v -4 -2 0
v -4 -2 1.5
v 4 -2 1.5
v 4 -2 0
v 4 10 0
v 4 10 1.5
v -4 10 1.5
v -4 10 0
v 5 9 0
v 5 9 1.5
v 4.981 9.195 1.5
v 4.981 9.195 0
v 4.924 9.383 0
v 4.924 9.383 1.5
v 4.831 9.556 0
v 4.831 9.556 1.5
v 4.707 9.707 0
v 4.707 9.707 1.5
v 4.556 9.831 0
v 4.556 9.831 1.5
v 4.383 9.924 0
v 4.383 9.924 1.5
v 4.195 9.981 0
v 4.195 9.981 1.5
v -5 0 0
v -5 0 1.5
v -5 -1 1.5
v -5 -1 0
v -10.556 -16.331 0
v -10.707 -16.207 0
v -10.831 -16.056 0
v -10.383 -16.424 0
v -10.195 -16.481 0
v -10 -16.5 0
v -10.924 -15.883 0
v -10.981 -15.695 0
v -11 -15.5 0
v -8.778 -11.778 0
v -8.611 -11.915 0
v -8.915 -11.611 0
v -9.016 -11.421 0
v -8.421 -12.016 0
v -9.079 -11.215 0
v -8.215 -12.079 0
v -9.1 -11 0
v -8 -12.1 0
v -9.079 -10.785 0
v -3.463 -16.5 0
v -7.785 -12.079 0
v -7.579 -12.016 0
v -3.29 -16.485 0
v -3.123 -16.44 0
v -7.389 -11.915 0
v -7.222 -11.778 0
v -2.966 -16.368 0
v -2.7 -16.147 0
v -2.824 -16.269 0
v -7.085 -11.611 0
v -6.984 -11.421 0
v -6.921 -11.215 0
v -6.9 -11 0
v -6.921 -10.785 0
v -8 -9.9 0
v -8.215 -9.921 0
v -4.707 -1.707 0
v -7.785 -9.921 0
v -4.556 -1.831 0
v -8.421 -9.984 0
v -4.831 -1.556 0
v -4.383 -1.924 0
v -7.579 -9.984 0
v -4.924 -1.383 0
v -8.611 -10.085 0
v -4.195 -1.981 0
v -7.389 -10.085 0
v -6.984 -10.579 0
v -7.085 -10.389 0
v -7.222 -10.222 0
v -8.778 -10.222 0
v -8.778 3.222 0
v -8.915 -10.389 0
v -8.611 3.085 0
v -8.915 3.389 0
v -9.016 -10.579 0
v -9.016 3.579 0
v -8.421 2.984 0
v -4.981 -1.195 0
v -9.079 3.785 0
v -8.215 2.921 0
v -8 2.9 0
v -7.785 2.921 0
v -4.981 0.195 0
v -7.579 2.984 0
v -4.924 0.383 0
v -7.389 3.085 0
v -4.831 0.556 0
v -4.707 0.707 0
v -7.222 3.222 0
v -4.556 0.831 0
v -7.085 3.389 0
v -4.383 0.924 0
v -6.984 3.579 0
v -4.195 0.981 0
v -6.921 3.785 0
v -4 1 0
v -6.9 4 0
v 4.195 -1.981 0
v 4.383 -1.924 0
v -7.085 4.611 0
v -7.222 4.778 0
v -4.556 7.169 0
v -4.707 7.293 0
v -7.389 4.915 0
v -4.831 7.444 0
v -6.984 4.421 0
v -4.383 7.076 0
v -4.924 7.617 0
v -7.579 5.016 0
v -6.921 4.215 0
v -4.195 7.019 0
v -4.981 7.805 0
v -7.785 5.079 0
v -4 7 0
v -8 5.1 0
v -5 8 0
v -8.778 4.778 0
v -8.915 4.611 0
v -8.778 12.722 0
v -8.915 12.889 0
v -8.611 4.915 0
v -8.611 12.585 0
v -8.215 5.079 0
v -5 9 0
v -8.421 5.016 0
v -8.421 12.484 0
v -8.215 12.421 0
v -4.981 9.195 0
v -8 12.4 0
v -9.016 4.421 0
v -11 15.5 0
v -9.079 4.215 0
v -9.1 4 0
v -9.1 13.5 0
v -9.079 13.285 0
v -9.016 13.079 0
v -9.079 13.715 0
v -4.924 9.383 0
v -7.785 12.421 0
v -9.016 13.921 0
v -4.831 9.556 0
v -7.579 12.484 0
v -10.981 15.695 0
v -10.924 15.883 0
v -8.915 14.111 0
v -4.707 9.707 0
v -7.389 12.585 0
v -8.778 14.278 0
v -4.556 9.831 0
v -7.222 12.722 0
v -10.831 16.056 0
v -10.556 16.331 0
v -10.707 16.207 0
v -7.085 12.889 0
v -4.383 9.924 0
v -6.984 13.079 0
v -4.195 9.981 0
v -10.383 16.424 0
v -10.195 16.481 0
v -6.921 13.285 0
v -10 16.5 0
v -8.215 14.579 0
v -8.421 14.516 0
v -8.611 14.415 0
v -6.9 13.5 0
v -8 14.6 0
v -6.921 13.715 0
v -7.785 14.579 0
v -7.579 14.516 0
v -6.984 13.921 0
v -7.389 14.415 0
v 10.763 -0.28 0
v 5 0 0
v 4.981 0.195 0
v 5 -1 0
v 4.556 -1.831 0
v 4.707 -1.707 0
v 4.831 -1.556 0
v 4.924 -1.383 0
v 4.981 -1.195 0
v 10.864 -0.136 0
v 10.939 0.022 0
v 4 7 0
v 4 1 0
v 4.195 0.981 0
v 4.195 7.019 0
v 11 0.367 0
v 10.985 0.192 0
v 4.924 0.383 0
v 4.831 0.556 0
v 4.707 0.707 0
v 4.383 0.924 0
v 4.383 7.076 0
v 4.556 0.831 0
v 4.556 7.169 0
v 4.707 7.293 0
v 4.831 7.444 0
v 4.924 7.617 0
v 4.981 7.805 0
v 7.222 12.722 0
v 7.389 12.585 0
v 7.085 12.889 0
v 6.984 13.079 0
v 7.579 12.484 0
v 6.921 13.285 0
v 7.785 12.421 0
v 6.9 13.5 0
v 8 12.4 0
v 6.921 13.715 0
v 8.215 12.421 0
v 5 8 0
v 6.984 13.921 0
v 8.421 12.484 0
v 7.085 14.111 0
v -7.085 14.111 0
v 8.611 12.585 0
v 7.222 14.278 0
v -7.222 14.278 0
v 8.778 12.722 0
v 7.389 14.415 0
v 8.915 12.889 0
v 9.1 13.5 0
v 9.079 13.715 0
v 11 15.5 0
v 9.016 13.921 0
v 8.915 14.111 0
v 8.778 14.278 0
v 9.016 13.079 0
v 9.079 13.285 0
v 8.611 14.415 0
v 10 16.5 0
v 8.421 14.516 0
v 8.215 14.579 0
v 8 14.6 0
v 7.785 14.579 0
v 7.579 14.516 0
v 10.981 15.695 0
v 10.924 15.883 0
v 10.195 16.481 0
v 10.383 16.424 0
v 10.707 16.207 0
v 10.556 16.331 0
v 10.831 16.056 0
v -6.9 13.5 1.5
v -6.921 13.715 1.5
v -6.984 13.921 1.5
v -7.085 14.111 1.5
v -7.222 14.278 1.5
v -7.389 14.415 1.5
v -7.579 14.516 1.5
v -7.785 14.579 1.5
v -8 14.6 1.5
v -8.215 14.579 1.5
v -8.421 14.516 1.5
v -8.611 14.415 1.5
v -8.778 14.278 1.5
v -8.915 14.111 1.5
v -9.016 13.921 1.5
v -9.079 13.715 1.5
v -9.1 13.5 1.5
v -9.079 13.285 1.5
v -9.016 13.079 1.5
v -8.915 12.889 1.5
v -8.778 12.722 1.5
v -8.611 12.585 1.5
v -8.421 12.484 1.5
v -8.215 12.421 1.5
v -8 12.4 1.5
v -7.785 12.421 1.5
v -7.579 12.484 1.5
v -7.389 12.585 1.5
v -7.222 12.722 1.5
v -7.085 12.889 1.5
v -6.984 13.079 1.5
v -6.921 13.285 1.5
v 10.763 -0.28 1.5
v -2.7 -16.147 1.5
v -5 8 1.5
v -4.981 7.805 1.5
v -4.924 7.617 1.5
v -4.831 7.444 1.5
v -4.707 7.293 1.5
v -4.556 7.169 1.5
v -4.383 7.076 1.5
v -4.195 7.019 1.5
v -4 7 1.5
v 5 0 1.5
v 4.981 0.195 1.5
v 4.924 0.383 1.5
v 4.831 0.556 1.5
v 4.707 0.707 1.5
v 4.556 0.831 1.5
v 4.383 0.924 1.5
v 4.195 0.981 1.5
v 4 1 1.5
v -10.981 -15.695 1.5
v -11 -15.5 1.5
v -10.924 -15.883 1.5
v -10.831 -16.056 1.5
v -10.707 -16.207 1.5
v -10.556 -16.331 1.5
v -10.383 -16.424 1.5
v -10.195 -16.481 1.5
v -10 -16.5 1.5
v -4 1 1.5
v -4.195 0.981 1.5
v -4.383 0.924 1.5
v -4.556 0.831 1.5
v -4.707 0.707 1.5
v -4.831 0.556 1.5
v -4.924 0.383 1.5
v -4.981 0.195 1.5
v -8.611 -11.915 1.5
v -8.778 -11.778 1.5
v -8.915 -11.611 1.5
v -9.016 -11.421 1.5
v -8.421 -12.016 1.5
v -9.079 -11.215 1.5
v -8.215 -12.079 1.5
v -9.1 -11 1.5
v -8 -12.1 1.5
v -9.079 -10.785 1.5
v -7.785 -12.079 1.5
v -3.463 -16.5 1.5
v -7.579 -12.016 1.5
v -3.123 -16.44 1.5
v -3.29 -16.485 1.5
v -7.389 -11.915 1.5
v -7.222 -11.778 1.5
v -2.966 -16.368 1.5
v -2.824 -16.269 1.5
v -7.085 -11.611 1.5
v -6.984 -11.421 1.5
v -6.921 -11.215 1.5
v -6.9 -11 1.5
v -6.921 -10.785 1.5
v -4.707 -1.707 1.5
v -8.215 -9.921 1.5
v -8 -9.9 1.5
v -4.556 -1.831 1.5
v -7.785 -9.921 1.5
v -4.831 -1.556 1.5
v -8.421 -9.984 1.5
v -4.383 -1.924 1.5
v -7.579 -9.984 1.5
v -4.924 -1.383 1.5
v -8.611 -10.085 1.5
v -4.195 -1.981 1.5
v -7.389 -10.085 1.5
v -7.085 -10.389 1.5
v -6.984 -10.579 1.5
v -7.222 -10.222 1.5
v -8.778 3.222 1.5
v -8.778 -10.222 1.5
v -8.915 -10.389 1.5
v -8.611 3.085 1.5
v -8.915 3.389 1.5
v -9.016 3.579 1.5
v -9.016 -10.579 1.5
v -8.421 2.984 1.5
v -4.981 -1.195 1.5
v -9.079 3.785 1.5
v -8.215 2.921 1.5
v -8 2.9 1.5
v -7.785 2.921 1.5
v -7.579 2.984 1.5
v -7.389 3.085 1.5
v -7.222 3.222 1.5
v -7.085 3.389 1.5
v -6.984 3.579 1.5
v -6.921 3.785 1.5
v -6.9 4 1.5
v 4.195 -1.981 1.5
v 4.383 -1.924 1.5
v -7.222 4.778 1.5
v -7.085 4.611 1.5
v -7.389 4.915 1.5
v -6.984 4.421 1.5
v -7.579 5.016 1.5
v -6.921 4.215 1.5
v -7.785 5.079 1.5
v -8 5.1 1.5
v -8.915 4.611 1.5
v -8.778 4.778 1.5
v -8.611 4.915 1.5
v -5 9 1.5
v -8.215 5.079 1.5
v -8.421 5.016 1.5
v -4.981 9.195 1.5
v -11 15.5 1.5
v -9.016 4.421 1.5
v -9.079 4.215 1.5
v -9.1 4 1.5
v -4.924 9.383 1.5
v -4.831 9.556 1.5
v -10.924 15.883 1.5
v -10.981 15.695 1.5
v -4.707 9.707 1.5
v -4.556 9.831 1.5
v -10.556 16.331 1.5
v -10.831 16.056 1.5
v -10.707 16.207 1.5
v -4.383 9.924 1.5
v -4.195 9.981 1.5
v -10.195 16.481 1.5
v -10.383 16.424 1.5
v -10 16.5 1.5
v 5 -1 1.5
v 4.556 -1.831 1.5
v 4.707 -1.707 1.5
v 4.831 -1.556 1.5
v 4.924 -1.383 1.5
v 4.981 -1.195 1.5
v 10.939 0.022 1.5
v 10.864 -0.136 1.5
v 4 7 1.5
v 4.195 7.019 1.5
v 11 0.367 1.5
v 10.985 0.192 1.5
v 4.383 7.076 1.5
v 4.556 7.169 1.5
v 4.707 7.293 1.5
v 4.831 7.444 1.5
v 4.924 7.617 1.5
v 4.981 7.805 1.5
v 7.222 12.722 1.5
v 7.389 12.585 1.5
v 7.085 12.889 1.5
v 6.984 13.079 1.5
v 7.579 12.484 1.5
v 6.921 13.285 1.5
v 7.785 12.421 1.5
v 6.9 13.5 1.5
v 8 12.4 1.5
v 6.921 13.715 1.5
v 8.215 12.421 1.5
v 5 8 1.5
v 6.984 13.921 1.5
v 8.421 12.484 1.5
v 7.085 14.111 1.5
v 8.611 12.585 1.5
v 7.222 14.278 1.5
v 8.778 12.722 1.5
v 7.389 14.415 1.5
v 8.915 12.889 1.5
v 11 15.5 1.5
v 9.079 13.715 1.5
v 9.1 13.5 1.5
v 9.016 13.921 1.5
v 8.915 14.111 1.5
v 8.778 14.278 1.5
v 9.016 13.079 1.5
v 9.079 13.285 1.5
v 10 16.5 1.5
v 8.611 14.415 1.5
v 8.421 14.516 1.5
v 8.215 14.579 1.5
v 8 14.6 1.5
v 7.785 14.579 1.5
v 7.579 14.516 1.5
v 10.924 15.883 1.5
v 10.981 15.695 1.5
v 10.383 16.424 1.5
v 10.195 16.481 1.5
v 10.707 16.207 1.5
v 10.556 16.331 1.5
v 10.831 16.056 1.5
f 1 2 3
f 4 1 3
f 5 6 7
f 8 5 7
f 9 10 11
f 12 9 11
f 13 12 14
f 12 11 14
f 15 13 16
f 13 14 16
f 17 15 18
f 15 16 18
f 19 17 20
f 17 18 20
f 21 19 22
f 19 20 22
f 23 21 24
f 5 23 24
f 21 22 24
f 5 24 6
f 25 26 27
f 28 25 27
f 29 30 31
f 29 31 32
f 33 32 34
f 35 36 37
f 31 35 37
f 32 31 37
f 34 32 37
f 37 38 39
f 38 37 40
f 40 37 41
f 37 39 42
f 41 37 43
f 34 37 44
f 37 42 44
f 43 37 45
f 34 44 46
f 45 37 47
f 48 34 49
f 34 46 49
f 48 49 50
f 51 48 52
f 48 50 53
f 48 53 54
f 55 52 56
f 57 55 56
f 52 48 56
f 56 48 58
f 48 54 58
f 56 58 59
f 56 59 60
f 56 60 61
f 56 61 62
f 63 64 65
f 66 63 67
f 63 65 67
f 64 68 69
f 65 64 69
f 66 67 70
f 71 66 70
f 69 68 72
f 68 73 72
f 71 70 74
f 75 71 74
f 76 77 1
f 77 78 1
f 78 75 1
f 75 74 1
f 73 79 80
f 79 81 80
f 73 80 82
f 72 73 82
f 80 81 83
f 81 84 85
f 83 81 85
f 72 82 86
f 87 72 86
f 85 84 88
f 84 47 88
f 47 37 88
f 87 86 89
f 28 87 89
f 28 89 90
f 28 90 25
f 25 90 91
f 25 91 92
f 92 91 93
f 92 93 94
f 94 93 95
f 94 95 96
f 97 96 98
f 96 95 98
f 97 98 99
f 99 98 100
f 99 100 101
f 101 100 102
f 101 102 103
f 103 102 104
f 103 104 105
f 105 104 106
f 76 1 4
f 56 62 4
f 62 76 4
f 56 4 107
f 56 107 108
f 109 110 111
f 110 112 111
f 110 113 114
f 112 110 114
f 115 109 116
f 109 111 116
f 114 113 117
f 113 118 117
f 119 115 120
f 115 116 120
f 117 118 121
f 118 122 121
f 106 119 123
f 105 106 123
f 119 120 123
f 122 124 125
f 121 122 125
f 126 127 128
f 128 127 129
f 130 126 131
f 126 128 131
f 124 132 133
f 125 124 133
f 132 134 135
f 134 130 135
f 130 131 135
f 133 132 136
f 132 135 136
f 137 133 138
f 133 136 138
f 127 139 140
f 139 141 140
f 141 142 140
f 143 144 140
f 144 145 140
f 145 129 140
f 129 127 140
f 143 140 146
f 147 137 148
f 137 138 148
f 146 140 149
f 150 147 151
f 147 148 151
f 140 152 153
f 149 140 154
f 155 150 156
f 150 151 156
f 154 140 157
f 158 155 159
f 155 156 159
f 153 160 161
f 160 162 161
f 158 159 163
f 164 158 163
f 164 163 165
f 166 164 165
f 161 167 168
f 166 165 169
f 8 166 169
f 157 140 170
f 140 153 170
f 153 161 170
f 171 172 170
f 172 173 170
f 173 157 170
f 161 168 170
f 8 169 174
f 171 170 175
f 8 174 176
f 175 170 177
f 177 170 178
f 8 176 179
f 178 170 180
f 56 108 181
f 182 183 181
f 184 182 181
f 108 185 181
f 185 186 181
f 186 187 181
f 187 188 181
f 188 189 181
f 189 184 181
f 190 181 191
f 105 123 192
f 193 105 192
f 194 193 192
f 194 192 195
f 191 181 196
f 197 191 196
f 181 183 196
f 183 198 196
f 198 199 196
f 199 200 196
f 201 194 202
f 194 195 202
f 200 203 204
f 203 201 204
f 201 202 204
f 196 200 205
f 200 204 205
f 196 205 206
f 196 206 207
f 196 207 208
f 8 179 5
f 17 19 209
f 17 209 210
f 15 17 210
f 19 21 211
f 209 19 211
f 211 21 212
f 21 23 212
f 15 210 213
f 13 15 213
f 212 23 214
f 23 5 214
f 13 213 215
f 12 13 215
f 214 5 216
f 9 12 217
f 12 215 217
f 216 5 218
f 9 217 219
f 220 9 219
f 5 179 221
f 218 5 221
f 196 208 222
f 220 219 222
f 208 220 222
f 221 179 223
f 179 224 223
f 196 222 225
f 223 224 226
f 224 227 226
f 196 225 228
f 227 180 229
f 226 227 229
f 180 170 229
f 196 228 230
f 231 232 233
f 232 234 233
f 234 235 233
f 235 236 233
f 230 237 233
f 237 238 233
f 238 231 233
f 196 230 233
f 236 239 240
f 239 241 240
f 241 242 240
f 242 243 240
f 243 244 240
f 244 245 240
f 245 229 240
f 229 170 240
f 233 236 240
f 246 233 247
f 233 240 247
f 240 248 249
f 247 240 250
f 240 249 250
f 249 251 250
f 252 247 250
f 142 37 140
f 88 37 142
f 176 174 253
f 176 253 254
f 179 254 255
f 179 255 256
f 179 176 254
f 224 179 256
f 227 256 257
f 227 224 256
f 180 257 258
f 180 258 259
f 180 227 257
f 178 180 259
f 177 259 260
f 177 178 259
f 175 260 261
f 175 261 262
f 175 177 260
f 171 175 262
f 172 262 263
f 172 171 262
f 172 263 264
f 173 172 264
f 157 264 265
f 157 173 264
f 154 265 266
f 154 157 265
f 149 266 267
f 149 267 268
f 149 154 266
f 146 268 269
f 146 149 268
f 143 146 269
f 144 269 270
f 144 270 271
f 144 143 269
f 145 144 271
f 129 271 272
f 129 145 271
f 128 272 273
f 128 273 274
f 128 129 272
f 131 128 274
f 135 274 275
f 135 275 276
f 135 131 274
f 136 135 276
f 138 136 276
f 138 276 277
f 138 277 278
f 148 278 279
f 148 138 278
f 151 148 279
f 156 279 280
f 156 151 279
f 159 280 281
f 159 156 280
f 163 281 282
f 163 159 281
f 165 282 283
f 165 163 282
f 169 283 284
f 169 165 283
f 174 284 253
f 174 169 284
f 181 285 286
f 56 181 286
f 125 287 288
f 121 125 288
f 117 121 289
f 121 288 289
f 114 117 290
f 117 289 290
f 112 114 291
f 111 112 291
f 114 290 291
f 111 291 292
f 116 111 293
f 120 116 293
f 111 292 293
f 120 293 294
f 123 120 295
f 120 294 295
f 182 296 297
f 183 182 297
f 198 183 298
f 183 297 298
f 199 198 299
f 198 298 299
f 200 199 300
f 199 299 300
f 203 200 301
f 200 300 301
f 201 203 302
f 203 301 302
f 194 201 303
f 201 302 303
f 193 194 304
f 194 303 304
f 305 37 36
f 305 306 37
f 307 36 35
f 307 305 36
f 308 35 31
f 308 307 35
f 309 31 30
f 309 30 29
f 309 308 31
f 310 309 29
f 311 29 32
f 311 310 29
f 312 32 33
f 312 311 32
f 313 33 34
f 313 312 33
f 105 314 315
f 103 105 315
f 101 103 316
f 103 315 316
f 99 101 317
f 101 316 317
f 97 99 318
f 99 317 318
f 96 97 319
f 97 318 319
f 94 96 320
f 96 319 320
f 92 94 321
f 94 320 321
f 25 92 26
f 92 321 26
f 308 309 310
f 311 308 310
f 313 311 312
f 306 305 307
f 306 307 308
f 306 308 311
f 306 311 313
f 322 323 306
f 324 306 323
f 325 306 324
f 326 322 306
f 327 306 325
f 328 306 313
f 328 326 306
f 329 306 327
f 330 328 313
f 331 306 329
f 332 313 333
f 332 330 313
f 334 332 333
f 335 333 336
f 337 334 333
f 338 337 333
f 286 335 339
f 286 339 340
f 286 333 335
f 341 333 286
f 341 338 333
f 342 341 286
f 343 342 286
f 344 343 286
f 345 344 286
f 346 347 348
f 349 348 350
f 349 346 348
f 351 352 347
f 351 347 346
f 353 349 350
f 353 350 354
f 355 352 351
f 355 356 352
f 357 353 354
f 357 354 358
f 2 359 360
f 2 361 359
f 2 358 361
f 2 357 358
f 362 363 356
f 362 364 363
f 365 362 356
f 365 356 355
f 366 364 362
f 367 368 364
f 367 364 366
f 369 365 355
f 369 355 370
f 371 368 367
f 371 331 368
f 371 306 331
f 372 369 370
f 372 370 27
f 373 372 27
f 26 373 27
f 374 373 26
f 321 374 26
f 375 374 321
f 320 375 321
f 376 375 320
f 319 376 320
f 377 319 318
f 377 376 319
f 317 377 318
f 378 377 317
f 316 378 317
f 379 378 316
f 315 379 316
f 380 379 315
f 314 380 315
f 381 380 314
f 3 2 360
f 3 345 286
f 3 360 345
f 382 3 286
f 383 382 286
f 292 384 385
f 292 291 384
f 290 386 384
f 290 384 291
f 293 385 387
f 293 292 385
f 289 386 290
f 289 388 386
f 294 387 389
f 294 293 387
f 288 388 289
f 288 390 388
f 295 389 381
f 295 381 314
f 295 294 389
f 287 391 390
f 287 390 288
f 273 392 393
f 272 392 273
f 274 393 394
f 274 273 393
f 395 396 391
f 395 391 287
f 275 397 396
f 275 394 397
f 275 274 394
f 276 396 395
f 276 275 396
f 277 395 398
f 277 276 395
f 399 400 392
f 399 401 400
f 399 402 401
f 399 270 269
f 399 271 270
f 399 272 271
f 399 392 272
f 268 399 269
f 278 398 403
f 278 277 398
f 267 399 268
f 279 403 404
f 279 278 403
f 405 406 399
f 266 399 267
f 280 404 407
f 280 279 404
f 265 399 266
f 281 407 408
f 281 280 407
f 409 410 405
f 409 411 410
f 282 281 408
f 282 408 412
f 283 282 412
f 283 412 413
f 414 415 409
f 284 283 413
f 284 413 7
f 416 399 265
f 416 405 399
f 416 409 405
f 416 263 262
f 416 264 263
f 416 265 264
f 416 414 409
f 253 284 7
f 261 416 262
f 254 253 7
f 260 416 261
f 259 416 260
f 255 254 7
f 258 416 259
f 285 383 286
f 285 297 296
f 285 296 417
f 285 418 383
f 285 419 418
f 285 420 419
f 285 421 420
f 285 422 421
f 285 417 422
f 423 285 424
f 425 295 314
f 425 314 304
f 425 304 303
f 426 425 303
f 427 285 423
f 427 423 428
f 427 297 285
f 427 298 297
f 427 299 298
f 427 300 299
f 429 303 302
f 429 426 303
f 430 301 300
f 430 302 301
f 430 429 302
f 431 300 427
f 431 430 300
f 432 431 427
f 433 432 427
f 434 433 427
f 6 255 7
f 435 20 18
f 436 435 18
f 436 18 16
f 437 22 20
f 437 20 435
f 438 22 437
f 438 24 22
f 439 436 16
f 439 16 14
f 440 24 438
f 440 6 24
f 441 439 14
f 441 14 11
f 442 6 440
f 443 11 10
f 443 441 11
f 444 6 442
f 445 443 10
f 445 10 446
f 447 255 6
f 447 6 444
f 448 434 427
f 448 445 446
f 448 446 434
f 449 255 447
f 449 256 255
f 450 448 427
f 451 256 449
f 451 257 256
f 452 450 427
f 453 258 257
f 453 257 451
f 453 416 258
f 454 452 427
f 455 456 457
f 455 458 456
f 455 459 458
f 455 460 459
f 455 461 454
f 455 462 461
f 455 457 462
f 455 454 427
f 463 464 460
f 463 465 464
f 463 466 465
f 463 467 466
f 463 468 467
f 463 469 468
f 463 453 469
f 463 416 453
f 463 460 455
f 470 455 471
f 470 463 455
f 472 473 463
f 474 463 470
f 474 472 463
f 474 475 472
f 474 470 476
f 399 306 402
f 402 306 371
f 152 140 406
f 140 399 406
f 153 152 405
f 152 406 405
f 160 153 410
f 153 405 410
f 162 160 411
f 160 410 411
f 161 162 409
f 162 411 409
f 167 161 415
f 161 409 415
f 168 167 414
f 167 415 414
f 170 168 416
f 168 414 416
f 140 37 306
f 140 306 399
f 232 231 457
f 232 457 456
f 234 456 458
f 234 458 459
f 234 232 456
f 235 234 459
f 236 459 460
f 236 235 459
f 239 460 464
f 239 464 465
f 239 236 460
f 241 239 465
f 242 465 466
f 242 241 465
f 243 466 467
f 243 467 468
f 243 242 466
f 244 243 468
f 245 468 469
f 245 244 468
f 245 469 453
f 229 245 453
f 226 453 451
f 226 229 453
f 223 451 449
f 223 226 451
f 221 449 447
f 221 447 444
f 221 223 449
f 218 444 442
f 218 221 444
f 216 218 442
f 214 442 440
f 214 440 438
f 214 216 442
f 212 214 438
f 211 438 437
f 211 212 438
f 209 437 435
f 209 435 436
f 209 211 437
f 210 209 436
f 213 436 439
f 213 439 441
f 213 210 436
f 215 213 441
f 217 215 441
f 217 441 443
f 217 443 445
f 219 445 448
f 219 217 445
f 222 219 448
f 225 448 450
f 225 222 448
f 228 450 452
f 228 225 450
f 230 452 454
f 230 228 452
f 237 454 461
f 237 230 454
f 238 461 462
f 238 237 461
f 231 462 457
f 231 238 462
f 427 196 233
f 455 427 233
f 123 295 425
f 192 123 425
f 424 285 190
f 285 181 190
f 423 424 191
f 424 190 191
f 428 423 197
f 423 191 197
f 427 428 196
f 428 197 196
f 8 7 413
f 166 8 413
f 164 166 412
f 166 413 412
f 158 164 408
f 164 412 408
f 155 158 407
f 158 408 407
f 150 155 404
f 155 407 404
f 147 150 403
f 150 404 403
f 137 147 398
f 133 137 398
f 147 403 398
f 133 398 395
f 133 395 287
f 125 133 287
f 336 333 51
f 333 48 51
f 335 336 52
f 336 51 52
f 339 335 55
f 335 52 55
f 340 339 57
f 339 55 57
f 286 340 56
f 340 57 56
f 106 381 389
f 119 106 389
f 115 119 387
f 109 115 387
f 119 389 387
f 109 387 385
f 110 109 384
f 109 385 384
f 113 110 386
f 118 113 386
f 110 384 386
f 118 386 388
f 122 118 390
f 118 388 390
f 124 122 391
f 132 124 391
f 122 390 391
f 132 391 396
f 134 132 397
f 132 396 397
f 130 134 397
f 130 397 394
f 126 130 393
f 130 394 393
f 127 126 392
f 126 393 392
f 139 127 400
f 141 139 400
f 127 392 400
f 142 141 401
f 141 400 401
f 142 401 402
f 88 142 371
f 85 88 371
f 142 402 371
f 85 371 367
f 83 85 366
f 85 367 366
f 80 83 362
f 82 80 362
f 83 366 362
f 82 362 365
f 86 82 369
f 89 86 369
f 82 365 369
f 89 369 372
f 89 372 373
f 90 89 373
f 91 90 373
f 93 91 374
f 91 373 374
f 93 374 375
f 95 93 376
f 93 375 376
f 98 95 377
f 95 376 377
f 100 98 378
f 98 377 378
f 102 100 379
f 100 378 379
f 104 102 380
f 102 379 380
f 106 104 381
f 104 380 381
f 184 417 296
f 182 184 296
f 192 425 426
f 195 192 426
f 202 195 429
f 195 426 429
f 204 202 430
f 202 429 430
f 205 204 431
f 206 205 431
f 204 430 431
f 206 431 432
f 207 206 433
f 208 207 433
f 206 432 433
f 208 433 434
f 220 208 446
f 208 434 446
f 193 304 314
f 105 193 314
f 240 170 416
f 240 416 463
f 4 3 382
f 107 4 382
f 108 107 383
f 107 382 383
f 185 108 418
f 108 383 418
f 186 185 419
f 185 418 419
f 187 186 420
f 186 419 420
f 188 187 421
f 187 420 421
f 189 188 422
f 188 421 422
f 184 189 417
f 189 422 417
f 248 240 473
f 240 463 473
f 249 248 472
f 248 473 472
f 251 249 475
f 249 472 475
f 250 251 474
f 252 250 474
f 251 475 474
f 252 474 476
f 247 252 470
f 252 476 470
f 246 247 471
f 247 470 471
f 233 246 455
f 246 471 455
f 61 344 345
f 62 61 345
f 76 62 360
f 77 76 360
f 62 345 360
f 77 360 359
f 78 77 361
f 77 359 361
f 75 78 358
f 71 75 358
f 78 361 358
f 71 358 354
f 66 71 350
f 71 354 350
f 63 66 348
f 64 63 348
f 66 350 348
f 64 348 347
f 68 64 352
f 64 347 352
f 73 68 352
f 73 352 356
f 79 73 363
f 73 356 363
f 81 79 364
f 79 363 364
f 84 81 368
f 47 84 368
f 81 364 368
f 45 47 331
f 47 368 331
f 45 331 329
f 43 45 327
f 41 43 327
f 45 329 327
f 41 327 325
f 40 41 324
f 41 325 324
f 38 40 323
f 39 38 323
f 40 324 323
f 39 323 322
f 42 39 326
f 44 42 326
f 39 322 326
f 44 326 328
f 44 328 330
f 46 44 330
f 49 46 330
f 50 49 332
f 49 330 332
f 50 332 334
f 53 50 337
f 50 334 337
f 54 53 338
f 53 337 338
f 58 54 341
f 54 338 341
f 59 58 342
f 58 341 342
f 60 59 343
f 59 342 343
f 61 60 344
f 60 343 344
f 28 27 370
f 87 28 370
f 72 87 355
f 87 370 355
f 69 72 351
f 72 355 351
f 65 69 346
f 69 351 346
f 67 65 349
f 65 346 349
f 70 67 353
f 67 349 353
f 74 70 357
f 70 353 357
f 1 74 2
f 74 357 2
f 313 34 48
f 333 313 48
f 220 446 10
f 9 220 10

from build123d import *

# Parameters (mm, degrees)
F0_W     = 22
F0_H     = 33
F0_R     = 1.1
F1_DEPTH = 1.5
F2_R     = 1.1
F3_DEPTH = 1.5
F4_R     = 1


# Not quite as in the source:
# - a feature names something its author has since deleted; it is built from what else it names


with BuildPart() as f1:
    # F0 (on Top) → F1 (new body)
    with BuildSketch(Plane.XY):
        Rectangle(F0_W, F0_H)
        with Locations((-8, 13.5)):
            Circle(F0_R, mode=Mode.SUBTRACT)
        with Locations((8, 13.5)):
            Circle(F0_R, mode=Mode.SUBTRACT)
    extrude(amount=F1_DEPTH)

    # F2 (on face) → F3 (cut, through all)
    with BuildSketch(Plane.XY.offset(1.5)):
        with BuildLine():
            Line((4, 10), (-4, 10))
            ThreePointArc((-4, 10), (-4.7071067812, 9.7071067812), (-5, 9))
            Line((-5, 9), (-5, 8))
            ThreePointArc((-5, 8), (-4.7071067812, 7.2928932188), (-4, 7))
            Line((-4, 7), (4, 7))
            ThreePointArc((4, 7), (4.7071067812, 7.2928932188), (5, 8))
            Line((5, 8), (5, 9))
            ThreePointArc((5, 9), (4.7071067812, 9.7071067812), (4, 10))
        make_face()
        with BuildLine():
            Line((4, 1), (-4, 1))
            ThreePointArc((-4, 1), (-4.7071067812, 0.7071067812), (-5, 0))
            Line((-5, 0), (-5, -1))
            ThreePointArc((-5, -1), (-4.7071067812, -1.7071067812), (-4, -2))
            Line((-4, -2), (4, -2))
            ThreePointArc((4, -2), (4.7071067812, -1.7071067812), (5, -1))
            Line((5, -1), (5, 0))
            ThreePointArc((5, 0), (4.7071067812, 0.7071067812), (4, 1))
        make_face()
        Polygon((11, -16.5), (11, 0), (-3, -16.5), align=None)
        with Locations((-8, 4)):
            Circle(F2_R)
        with Locations((-8, -11)):
            Circle(F2_R)
    extrude(amount=-F3_DEPTH, mode=Mode.SUBTRACT)

    # F4
    f4_edges = [f1.edges().sort_by_distance(p)[0] for p in [
        (-11, 16.5, 0.75),
        (11, 16.5, 0.75),
        (-11, -16.5, 0.75),
        (11, 0, 0.75),
        (-3, -16.5, 0.75),
    ]]
    fillet(f4_edges, radius=F4_R)


solid = f1.part
